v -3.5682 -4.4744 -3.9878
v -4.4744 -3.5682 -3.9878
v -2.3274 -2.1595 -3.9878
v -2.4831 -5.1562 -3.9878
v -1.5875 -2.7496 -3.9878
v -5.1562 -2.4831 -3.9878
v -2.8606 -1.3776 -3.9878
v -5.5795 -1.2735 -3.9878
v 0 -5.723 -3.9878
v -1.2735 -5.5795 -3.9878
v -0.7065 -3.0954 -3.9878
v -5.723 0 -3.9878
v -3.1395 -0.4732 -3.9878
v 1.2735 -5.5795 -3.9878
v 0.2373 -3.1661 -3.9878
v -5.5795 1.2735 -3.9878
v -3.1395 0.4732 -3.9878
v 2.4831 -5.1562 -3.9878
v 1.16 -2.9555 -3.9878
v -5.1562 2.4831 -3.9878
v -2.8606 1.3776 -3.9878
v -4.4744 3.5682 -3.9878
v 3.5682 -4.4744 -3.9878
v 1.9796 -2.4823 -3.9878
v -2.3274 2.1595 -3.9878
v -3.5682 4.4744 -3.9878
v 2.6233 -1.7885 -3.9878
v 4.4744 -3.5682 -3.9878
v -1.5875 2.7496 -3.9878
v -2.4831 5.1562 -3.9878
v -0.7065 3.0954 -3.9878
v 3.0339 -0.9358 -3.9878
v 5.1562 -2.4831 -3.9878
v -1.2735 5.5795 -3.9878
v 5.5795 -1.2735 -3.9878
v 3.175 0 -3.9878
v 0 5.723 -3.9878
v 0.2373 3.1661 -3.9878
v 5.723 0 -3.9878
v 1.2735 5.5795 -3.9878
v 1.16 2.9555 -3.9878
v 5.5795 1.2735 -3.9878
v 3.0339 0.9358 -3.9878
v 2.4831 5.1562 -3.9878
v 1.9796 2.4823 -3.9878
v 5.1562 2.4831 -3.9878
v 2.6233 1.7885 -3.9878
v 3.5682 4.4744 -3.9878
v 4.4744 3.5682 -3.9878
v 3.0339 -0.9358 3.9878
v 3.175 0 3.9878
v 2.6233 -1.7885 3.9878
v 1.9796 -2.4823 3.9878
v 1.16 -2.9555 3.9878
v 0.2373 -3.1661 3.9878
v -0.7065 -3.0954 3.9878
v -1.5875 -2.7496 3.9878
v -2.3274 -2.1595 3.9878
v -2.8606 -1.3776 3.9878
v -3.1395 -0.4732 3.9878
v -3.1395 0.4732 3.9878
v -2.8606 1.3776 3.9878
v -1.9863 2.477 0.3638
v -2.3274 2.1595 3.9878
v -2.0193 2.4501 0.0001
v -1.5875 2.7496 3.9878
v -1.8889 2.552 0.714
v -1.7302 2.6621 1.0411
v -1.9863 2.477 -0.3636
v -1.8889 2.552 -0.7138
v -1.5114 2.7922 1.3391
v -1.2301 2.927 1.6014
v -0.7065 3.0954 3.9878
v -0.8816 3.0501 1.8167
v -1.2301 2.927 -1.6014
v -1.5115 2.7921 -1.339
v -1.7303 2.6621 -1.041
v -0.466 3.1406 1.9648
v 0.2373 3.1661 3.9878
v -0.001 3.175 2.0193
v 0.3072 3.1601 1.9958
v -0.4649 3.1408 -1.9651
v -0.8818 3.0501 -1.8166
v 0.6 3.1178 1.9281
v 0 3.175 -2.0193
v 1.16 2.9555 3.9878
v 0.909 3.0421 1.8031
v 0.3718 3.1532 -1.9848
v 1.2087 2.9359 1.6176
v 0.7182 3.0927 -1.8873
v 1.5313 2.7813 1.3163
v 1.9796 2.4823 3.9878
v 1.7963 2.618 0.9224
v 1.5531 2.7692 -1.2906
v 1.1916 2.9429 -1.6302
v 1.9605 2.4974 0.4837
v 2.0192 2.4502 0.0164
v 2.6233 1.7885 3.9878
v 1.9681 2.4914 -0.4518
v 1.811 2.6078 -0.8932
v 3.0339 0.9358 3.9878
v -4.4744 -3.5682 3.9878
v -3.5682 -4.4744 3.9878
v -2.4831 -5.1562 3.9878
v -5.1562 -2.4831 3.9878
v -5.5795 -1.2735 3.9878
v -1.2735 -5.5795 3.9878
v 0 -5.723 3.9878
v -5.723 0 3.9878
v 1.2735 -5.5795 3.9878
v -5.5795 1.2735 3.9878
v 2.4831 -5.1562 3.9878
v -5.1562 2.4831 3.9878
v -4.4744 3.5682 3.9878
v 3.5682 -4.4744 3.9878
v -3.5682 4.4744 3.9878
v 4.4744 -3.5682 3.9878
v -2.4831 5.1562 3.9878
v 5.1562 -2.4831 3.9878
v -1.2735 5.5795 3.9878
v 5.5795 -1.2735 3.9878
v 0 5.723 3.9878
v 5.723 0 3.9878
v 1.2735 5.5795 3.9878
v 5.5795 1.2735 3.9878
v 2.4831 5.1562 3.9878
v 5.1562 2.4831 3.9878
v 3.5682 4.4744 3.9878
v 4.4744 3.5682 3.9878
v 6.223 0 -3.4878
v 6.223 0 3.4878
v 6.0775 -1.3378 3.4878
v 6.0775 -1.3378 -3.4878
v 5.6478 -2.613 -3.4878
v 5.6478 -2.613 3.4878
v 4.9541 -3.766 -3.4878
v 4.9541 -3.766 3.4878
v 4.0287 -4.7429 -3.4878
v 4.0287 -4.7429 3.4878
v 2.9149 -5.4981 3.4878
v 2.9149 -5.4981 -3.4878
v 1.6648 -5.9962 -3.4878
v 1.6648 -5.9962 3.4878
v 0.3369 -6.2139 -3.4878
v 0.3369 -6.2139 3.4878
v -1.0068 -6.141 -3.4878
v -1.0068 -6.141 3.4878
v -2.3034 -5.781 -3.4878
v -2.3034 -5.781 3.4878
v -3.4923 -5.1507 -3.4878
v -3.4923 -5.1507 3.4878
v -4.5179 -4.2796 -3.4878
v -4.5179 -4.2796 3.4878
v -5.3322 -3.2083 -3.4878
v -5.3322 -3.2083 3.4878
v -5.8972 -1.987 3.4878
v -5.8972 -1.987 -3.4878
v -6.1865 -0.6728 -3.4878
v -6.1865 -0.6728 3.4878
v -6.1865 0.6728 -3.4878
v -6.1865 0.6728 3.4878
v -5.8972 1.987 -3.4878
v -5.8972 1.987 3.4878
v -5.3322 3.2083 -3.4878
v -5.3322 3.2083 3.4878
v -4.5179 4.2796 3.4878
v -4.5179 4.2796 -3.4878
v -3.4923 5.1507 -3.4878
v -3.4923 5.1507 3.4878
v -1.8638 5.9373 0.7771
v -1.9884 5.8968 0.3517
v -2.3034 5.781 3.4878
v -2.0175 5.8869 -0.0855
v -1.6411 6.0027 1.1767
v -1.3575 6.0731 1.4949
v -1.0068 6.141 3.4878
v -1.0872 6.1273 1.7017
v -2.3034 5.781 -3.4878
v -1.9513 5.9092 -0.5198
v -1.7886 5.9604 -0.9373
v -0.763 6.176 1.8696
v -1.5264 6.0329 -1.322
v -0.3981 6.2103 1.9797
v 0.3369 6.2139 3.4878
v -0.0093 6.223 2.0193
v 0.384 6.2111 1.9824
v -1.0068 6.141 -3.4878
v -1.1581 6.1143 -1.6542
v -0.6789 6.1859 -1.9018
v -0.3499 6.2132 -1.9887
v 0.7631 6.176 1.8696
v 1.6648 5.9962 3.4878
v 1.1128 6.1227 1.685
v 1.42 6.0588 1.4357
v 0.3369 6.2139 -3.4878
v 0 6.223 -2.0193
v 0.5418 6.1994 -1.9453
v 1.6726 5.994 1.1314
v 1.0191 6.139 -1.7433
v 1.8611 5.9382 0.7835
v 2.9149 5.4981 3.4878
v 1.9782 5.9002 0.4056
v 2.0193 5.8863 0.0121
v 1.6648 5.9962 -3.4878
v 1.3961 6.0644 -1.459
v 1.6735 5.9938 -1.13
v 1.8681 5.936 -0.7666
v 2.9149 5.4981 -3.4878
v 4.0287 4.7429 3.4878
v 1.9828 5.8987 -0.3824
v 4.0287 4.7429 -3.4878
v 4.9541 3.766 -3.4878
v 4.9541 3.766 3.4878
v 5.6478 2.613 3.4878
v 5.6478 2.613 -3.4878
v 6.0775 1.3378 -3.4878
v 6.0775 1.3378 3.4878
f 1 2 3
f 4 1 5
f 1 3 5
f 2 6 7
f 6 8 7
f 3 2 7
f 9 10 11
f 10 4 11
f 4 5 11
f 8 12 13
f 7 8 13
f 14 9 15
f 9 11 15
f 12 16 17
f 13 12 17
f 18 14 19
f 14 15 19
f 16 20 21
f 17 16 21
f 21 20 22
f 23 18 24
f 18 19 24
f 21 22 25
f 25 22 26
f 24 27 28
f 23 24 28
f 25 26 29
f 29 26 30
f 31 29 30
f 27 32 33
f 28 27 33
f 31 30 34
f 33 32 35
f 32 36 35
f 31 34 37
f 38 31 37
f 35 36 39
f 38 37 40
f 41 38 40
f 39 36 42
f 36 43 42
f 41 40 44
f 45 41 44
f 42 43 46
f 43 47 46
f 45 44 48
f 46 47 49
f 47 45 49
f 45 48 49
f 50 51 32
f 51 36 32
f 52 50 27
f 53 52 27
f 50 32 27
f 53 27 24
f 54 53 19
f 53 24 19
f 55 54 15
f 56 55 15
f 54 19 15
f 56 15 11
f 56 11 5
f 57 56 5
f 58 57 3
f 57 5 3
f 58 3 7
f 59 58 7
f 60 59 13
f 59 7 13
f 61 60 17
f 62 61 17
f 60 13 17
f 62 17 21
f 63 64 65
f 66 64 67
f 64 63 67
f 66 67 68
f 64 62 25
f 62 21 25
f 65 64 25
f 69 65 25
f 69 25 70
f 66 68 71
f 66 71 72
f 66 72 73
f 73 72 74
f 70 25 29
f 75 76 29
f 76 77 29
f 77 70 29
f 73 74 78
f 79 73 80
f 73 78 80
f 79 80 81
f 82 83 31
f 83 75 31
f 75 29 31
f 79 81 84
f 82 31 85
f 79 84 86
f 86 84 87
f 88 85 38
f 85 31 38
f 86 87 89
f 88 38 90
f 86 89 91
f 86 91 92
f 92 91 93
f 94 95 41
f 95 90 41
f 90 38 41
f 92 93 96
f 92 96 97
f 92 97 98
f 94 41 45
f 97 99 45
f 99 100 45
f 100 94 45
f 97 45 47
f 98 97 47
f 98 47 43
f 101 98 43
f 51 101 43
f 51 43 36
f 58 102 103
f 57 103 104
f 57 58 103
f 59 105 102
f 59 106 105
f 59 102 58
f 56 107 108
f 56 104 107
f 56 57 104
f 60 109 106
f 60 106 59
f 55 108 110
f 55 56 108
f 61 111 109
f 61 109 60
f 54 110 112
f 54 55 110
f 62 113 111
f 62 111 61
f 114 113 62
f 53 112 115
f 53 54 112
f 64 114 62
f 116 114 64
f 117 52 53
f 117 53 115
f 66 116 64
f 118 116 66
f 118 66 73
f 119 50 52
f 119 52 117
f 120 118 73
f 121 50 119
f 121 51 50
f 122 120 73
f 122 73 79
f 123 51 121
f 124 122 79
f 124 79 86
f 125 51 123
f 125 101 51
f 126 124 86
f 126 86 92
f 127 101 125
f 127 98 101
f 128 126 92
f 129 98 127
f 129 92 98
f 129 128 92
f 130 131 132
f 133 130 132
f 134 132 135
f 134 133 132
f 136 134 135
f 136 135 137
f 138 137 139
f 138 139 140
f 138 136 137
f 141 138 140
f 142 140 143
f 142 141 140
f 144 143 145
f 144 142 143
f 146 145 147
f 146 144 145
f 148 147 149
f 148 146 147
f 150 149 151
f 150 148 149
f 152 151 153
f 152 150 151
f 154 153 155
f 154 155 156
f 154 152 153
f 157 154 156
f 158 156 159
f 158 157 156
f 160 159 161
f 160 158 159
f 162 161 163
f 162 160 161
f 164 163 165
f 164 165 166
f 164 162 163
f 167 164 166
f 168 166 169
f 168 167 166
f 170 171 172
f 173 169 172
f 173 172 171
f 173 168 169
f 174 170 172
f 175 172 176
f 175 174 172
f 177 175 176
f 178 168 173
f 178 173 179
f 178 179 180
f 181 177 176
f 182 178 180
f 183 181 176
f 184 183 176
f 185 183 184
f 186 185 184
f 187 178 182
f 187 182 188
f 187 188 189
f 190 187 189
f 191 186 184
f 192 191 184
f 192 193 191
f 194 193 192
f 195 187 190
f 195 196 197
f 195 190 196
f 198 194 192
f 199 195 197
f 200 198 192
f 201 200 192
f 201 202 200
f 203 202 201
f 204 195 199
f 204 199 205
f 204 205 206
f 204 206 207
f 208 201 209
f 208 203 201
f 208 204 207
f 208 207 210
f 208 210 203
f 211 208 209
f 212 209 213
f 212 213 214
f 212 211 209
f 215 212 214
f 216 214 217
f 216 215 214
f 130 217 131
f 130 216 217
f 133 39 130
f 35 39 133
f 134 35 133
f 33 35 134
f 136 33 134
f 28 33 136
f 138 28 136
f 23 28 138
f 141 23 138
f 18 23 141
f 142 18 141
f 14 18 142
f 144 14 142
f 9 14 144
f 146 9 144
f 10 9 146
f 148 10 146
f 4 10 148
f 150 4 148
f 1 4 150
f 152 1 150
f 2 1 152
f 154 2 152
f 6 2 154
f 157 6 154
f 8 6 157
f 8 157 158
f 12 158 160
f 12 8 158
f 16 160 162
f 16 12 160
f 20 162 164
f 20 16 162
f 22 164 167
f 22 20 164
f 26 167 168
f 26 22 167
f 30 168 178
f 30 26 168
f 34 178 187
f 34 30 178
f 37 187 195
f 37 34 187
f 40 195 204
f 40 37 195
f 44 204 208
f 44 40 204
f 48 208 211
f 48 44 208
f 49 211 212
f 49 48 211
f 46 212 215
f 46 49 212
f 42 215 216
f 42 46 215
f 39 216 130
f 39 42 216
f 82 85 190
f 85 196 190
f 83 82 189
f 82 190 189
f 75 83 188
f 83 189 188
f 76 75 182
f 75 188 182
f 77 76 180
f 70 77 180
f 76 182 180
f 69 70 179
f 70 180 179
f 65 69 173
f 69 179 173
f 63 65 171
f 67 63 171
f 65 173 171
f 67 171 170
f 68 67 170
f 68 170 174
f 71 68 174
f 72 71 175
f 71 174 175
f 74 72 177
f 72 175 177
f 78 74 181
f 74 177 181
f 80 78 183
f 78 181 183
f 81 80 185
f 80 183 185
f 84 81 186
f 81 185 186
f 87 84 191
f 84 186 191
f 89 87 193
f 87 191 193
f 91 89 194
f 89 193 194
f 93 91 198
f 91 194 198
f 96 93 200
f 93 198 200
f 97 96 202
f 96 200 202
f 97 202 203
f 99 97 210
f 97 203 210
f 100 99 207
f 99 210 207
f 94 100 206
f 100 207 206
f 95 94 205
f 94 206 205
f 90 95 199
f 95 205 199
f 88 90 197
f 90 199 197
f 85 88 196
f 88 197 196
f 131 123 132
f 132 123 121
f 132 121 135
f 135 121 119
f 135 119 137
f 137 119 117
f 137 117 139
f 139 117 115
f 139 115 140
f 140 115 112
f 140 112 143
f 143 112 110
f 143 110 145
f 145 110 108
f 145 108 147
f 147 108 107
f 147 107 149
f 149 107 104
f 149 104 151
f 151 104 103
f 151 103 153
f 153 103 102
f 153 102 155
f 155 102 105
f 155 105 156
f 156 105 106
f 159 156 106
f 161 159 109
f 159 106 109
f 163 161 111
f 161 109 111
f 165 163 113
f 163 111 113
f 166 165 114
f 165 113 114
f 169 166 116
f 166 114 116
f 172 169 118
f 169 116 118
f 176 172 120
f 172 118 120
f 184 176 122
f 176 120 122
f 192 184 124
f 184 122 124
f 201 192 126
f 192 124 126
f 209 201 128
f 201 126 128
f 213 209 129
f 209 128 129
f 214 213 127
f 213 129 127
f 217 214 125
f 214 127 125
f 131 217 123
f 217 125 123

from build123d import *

# Parameters (mm, degrees)
SKETCH1_R     = 6.223
SKETCH1_R_2   = 3.175
CHAMFER1_SIZE = 0.5
SKETCH4_W     = 2.0193
SKETCH4_H     = 6.223


with BuildPart() as part:
    # Sweep1: sweep along a path in Sketch2
    with BuildLine(Plane(origin=(0, 0, 0), x_dir=(1, 0, 0), z_dir=(0, 1, 0))) as sweep1_path:
        Line((0, -3.9878), (0, 3.9878))
    # Sketch1 → Sweep1 (sweep)
    with BuildSketch(Plane.XY):
        Circle(SKETCH1_R)
        Circle(SKETCH1_R_2, mode=Mode.SUBTRACT)
    sweep(path=sweep1_path.line)

    # Chamfer1
    chamfer1_edges = [part.edges().sort_by_distance(p)[0] for p in [
        (-6.223, 0, 3.9878),
        (-6.223, 0, -3.9878),
    ]]
    chamfer(chamfer1_edges, length=CHAMFER1_SIZE)

    # Sketch4 → Tap Drill for #10-32 Tap1 (revolve, cut)
    with BuildSketch(Plane(origin=(0, 0, 0), x_dir=(0, 0, -1), z_dir=(1, 0, 0))):
        with Locations((1.00965, 3.1115)):
            Rectangle(SKETCH4_W, SKETCH4_H)
    revolve(axis=Axis((0, -6.35, 0), (0, 1, 0)), mode=Mode.SUBTRACT)


solid = part.part
